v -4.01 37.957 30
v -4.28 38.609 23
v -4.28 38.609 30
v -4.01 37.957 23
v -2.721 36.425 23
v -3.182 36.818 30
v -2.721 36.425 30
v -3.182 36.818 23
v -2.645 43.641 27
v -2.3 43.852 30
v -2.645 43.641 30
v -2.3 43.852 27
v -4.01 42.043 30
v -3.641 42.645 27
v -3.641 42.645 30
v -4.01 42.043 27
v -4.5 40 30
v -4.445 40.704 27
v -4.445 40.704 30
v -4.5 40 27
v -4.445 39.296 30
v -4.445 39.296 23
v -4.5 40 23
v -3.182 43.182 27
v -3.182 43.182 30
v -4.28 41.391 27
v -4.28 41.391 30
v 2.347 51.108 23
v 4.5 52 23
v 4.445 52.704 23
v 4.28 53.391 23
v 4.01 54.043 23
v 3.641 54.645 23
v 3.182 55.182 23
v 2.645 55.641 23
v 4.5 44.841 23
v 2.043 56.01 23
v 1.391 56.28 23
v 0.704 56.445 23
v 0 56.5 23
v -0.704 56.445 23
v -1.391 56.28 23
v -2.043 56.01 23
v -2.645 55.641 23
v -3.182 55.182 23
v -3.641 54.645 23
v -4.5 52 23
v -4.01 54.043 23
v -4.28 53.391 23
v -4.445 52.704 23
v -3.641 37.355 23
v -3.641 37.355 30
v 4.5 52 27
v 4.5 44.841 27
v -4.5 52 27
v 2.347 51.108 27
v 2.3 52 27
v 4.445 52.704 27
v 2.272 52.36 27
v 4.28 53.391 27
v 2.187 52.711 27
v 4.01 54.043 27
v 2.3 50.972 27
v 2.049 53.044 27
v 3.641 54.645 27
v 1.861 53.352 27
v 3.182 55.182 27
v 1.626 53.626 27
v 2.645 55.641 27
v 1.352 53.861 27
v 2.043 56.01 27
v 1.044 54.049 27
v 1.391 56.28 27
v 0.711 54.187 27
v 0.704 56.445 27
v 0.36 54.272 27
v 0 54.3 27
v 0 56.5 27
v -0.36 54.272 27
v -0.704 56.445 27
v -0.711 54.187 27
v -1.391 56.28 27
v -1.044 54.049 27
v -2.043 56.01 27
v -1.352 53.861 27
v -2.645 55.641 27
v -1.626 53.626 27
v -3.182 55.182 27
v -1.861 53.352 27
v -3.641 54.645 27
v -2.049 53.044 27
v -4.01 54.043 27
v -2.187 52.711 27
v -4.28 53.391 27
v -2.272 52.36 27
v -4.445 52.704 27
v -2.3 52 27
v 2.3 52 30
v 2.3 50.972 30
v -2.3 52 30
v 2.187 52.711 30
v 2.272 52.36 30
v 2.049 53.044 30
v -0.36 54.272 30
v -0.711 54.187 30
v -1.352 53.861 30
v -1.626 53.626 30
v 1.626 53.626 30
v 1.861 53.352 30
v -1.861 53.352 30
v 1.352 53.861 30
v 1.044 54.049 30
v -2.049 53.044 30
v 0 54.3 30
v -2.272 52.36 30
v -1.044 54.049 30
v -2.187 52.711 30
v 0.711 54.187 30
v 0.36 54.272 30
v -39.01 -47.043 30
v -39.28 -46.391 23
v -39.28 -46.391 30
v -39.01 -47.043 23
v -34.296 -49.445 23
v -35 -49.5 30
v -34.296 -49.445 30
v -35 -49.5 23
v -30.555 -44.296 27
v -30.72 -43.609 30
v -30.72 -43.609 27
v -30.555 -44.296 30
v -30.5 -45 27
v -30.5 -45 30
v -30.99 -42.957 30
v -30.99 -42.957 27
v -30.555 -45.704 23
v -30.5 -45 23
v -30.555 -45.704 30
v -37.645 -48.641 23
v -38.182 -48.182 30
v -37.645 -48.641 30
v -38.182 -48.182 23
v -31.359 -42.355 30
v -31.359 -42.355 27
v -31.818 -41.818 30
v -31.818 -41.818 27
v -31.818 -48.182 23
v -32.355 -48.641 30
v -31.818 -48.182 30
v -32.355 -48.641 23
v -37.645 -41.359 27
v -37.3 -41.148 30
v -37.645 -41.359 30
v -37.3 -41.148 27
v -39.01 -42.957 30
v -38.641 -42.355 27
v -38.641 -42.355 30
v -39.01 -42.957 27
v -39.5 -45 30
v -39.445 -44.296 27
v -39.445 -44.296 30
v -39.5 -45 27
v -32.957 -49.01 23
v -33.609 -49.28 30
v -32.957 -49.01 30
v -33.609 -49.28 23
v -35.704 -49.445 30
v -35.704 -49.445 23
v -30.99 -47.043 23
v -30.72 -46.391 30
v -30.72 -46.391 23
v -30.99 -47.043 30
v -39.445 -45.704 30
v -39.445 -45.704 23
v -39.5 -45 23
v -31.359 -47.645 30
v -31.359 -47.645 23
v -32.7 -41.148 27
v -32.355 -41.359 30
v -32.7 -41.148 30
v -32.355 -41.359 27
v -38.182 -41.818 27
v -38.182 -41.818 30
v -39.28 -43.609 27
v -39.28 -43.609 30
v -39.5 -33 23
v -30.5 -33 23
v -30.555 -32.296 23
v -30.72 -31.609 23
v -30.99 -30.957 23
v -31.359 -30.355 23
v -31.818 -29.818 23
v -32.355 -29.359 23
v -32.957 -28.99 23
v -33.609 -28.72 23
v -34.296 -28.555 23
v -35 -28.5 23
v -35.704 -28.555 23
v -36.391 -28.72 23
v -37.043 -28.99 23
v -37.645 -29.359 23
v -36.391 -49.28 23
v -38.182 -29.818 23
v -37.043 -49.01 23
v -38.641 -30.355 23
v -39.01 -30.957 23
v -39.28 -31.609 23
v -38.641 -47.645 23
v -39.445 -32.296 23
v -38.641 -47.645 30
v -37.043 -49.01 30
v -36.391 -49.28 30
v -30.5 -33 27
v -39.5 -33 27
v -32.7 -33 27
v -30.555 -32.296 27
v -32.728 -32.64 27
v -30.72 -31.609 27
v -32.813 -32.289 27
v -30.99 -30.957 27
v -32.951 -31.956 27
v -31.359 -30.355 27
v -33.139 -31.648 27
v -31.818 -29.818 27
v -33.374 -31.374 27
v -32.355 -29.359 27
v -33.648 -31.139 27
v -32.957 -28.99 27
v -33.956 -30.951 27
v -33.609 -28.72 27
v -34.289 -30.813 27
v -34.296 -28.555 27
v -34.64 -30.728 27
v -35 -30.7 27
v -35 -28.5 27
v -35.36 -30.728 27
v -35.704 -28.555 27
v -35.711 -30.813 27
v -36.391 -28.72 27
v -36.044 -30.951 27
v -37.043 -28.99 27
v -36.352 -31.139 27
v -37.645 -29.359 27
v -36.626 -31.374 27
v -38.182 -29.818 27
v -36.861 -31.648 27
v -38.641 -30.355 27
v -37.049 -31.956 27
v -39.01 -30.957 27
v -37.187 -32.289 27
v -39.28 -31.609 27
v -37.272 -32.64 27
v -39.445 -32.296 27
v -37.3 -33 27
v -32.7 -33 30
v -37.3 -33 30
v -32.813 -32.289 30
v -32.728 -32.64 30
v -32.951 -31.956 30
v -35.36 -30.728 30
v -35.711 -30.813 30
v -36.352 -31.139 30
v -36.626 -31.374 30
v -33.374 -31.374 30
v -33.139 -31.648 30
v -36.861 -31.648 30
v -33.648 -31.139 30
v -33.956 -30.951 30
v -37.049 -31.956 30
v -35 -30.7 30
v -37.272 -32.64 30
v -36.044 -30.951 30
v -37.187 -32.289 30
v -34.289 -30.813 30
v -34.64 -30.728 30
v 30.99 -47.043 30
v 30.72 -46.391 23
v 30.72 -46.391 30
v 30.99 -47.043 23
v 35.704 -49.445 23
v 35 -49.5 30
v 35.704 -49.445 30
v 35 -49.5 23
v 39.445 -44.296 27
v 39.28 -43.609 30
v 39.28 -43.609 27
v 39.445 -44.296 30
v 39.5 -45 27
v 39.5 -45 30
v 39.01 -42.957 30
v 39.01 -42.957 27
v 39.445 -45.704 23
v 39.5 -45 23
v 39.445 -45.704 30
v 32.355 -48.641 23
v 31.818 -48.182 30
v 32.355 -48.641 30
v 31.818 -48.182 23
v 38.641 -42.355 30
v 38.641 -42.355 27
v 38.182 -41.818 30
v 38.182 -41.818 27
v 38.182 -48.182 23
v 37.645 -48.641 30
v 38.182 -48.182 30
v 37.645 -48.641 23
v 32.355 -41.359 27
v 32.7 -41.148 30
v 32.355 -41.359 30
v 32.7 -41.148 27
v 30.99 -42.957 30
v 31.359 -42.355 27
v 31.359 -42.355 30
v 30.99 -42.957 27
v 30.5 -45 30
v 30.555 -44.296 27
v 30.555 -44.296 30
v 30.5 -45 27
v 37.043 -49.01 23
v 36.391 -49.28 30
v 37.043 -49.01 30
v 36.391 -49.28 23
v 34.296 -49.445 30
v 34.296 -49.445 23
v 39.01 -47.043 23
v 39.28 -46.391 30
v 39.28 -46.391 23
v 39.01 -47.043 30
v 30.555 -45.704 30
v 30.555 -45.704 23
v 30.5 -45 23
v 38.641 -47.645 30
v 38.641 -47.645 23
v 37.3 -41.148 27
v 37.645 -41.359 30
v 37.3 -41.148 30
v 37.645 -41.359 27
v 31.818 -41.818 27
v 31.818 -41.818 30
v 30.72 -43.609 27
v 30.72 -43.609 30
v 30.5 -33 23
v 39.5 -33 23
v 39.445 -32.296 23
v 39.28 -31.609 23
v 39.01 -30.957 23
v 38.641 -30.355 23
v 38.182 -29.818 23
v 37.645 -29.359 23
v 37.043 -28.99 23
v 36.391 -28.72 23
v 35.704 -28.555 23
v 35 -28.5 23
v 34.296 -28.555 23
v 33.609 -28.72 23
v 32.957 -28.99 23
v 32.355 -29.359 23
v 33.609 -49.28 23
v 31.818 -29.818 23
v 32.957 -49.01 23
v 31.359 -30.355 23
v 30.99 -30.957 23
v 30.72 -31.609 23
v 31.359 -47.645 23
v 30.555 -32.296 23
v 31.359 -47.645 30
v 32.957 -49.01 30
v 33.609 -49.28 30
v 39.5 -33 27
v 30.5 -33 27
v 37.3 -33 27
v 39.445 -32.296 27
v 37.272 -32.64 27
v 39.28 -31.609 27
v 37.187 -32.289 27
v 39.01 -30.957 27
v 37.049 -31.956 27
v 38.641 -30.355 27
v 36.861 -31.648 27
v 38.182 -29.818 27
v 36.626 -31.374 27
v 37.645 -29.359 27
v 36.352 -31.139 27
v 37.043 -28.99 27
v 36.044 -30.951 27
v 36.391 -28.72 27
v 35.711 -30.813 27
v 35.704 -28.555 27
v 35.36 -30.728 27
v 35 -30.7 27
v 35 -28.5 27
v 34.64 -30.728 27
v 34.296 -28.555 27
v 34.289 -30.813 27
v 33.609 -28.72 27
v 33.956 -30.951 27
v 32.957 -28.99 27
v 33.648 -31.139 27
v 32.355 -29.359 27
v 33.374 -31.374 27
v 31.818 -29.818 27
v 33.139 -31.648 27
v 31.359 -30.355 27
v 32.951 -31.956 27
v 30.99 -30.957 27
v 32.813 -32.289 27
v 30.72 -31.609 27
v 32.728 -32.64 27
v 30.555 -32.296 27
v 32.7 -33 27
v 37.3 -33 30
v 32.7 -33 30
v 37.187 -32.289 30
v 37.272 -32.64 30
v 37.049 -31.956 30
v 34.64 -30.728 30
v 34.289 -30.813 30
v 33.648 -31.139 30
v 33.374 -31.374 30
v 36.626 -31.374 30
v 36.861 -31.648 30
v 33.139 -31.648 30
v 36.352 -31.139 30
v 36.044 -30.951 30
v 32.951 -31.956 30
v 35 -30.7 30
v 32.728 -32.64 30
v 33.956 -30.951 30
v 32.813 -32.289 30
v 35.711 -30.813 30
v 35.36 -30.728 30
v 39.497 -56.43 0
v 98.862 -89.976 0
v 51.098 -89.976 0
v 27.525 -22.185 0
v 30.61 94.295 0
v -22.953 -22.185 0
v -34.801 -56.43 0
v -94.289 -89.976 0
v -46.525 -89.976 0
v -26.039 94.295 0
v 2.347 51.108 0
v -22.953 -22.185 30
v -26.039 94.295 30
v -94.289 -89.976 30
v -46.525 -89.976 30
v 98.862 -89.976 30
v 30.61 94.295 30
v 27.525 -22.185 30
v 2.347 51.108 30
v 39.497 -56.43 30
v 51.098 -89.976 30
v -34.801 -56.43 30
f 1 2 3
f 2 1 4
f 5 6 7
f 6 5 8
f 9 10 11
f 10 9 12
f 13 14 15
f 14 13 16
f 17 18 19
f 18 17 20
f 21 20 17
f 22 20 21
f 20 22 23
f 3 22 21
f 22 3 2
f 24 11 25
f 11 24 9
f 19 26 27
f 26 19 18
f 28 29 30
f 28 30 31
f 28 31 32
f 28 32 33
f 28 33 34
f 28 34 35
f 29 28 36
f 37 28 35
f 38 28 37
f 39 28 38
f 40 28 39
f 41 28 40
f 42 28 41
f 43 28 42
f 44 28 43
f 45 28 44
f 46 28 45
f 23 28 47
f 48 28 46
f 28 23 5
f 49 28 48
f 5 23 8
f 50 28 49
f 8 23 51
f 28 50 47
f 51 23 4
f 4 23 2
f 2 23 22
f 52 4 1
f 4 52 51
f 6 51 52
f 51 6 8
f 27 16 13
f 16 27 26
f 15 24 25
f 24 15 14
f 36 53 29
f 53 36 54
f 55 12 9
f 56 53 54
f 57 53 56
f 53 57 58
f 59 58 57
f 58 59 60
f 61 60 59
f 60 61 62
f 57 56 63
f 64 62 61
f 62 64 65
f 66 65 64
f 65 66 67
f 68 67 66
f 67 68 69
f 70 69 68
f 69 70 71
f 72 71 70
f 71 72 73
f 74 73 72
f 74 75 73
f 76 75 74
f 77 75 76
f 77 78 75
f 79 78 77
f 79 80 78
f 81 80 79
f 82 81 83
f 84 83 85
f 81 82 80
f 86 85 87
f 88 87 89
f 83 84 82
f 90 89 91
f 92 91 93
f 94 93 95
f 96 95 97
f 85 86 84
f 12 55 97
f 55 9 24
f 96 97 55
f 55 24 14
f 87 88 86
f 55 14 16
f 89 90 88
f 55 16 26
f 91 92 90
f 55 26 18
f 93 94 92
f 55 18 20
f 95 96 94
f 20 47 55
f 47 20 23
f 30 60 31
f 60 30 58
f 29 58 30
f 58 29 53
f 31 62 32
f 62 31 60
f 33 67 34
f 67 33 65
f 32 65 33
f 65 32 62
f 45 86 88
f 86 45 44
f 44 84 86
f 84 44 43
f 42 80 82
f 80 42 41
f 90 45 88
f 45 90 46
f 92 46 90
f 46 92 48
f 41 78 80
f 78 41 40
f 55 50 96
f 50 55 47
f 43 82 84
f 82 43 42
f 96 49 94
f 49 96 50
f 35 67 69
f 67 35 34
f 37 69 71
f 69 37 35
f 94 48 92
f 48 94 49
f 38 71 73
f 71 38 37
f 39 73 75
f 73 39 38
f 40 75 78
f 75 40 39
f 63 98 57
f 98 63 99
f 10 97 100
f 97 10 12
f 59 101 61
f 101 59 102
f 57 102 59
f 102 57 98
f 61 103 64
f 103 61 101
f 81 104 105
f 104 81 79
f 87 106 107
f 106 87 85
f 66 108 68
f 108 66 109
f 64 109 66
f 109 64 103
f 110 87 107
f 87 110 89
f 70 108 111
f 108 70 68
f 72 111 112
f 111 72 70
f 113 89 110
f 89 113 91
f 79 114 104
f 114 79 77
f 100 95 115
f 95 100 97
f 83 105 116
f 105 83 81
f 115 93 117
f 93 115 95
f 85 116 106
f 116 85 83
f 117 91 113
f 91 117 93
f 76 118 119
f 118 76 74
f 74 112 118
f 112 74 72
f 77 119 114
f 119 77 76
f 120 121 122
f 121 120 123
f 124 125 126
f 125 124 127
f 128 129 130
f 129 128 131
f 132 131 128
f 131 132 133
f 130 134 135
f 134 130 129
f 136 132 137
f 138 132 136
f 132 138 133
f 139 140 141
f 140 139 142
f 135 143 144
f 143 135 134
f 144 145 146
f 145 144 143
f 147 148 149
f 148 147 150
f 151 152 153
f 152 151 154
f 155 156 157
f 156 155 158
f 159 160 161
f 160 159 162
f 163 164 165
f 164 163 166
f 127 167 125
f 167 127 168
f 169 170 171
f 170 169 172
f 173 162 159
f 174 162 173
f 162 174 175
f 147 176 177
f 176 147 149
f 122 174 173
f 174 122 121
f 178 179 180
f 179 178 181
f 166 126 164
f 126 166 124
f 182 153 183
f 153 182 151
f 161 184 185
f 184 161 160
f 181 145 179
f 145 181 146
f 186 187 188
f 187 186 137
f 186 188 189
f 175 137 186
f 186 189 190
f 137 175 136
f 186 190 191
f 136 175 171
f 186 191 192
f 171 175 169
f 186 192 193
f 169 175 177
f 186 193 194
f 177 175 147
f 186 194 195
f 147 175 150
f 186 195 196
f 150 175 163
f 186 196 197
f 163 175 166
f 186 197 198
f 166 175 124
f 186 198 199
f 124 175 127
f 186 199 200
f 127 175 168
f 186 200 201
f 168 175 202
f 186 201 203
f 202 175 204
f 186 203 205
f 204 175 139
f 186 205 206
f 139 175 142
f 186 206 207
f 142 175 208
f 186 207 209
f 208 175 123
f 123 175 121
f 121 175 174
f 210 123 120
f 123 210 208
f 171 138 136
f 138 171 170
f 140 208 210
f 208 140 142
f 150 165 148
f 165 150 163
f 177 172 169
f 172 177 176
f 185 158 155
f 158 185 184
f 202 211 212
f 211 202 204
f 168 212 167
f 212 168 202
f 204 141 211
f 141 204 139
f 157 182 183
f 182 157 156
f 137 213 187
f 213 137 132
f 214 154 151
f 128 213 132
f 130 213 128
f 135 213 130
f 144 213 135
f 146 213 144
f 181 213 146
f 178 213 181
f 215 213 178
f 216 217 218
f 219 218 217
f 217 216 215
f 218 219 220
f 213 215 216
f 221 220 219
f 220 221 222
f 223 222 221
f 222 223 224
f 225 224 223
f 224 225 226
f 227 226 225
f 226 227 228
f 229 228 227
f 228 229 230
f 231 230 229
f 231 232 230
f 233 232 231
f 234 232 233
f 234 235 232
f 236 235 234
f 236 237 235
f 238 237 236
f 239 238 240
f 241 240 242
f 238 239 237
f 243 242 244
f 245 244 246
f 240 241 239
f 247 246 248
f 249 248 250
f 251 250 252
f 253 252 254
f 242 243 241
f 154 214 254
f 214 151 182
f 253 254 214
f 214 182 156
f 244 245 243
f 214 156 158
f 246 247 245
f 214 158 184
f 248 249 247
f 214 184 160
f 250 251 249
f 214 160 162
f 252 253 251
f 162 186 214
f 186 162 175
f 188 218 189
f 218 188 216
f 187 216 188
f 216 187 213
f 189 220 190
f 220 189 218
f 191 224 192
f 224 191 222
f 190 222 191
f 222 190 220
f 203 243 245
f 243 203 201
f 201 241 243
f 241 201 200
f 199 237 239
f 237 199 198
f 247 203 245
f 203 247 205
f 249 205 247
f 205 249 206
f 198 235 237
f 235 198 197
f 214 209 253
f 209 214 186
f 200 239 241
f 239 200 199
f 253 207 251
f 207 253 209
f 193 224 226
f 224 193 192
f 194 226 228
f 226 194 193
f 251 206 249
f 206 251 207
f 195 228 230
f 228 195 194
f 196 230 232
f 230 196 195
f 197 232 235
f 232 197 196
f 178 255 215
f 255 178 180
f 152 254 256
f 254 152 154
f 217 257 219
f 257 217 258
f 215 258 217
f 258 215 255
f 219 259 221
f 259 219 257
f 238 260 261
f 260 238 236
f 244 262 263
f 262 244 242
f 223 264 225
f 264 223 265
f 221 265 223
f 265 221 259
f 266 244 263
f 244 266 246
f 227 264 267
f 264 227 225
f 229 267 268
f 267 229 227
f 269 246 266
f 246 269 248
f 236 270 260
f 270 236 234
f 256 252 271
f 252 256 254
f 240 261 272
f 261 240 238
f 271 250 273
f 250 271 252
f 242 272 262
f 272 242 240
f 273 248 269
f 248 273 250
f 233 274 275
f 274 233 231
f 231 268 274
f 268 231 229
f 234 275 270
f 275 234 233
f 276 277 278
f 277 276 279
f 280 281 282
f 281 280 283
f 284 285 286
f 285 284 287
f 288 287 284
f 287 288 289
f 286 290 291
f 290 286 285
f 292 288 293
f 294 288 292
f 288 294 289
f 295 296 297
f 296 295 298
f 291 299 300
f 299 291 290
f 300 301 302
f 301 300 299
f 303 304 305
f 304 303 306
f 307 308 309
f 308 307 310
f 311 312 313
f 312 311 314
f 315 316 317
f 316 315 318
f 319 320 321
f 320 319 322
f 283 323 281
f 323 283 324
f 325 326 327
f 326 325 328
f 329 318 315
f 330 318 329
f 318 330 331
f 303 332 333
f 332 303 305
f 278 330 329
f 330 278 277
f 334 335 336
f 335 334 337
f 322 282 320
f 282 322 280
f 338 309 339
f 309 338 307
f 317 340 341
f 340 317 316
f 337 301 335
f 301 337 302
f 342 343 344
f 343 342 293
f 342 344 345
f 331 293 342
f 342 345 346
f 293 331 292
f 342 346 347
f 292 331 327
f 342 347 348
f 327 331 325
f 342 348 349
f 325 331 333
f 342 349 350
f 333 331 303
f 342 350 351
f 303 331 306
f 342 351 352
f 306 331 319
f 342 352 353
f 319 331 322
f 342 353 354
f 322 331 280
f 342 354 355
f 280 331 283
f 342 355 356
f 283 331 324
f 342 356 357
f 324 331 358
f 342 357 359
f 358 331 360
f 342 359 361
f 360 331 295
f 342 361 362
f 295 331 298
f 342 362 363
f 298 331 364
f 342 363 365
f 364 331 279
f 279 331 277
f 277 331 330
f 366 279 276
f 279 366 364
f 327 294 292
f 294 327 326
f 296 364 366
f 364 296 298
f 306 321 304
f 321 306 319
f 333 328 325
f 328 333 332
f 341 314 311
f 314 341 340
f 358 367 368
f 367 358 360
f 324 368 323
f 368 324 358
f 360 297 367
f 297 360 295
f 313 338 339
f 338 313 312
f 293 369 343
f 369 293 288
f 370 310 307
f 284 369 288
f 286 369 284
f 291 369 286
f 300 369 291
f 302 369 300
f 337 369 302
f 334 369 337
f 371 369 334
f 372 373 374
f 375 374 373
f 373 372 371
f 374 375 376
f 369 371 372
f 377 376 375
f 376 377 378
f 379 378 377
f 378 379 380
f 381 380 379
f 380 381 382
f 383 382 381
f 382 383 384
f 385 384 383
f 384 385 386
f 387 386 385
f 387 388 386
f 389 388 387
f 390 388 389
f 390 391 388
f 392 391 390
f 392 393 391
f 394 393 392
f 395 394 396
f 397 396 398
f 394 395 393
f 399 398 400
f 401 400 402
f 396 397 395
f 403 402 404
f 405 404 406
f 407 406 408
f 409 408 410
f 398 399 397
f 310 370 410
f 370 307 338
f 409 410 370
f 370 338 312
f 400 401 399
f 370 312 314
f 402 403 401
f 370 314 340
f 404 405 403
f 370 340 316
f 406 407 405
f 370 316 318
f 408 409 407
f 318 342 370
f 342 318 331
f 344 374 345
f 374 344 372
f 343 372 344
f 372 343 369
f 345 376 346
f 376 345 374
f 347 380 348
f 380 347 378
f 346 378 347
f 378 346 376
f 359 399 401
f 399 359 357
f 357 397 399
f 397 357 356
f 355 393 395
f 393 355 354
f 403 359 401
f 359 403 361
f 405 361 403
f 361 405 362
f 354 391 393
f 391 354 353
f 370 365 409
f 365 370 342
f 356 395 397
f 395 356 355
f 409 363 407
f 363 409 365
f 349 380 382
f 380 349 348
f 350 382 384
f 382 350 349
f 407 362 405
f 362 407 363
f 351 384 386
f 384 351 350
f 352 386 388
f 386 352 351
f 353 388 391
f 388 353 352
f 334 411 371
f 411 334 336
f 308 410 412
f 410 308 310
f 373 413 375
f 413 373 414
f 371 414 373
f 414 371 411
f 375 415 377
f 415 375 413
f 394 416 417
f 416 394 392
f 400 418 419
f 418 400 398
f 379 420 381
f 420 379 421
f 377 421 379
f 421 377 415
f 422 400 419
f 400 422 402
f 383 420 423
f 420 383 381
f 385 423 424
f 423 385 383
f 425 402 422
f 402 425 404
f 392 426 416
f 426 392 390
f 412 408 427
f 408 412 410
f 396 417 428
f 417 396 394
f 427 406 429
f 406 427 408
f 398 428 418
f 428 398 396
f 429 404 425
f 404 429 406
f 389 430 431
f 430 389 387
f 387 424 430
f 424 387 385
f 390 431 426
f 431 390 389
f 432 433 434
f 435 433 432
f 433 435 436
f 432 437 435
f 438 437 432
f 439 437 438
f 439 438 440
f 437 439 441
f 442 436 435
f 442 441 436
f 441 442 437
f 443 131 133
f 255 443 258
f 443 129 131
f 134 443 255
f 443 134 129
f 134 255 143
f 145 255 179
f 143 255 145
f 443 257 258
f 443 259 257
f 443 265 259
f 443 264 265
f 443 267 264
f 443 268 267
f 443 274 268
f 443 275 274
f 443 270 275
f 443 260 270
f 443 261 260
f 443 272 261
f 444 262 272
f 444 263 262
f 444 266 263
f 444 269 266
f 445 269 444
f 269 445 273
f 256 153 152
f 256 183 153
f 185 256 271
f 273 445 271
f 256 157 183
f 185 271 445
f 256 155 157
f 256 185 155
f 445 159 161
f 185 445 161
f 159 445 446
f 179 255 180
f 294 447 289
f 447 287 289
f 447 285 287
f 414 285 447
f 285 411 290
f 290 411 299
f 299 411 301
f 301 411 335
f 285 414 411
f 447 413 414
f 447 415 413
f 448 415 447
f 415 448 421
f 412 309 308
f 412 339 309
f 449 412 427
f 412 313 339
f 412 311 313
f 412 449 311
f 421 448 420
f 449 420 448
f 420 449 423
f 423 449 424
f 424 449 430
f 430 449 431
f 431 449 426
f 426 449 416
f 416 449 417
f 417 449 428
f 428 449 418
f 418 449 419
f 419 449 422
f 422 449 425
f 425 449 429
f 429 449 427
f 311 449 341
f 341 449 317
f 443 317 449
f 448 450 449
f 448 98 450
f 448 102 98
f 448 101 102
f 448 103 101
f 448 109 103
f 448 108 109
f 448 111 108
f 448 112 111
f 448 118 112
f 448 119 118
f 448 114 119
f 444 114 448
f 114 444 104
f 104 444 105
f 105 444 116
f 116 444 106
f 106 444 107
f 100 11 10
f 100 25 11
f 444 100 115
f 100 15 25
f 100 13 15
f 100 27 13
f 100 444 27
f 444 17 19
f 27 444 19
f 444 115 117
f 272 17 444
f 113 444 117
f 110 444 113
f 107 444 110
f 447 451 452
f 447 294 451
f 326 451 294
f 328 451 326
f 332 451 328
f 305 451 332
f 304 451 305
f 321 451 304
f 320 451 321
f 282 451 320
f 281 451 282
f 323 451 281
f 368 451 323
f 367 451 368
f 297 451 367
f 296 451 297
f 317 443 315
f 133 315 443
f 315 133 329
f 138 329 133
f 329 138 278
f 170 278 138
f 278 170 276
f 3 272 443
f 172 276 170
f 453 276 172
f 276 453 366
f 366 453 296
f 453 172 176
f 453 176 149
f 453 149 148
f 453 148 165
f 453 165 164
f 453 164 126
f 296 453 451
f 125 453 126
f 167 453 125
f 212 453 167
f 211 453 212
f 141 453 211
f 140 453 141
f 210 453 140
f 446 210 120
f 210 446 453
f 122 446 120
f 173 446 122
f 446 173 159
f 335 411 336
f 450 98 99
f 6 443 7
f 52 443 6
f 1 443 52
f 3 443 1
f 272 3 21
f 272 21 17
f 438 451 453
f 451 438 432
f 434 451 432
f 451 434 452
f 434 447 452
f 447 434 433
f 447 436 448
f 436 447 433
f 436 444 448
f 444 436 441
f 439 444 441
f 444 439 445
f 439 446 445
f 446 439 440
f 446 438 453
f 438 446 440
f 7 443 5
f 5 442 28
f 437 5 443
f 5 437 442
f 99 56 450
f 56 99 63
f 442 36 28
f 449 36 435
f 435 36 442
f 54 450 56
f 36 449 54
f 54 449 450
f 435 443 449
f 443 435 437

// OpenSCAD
// Logotipo COW AI - Letra A (Relieve 30mm)
// Diseñado para impresión en Bambu Lab P1S (Cara frontal hacia abajo en cama PEI)


$fn = 40;

// Keyhole hanger pocket for wall mounting (face-down printing: rear is at z=depth)
module keyhole_pocket(depth = 30) {
    translate([0, 0, depth - 7]) {
        // Screw head insertion pocket (9mm dia, 7.2mm deep)
        cylinder(d = 9.0, h = 7.2);
        
        // Internal slide channel for screw head (9mm wide, 12mm high, 4mm deep)
        translate([-4.5, 0, 0]) cube([9.0, 12.0, 4.0]);
        translate([0, 12, 0]) cylinder(d = 9.0, h = 4.0);
        
        // Screw shank slot to the wall surface (4.6mm wide, 12mm high, 3.2mm deep)
        translate([-2.3, 0, 4.0]) cube([4.6, 12.0, 3.2]);
        translate([0, 12, 4.0]) cylinder(d = 4.6, h = 3.2);
    }
}


difference() {
    // Letra extruida 30mm
    linear_extrude(height = 30, convexity = 10)
        text("A", font = "Ubuntu:style=Bold", size = 182, halign = "center", valign = "center");
        
    // Alojamientos traseros para anclaje a pared
    translate([0, 40, 0]) keyhole_pocket(depth = 30);
    translate([-35, -45, 0]) keyhole_pocket(depth = 30);
    translate([35, -45, 0]) keyhole_pocket(depth = 30);
}
